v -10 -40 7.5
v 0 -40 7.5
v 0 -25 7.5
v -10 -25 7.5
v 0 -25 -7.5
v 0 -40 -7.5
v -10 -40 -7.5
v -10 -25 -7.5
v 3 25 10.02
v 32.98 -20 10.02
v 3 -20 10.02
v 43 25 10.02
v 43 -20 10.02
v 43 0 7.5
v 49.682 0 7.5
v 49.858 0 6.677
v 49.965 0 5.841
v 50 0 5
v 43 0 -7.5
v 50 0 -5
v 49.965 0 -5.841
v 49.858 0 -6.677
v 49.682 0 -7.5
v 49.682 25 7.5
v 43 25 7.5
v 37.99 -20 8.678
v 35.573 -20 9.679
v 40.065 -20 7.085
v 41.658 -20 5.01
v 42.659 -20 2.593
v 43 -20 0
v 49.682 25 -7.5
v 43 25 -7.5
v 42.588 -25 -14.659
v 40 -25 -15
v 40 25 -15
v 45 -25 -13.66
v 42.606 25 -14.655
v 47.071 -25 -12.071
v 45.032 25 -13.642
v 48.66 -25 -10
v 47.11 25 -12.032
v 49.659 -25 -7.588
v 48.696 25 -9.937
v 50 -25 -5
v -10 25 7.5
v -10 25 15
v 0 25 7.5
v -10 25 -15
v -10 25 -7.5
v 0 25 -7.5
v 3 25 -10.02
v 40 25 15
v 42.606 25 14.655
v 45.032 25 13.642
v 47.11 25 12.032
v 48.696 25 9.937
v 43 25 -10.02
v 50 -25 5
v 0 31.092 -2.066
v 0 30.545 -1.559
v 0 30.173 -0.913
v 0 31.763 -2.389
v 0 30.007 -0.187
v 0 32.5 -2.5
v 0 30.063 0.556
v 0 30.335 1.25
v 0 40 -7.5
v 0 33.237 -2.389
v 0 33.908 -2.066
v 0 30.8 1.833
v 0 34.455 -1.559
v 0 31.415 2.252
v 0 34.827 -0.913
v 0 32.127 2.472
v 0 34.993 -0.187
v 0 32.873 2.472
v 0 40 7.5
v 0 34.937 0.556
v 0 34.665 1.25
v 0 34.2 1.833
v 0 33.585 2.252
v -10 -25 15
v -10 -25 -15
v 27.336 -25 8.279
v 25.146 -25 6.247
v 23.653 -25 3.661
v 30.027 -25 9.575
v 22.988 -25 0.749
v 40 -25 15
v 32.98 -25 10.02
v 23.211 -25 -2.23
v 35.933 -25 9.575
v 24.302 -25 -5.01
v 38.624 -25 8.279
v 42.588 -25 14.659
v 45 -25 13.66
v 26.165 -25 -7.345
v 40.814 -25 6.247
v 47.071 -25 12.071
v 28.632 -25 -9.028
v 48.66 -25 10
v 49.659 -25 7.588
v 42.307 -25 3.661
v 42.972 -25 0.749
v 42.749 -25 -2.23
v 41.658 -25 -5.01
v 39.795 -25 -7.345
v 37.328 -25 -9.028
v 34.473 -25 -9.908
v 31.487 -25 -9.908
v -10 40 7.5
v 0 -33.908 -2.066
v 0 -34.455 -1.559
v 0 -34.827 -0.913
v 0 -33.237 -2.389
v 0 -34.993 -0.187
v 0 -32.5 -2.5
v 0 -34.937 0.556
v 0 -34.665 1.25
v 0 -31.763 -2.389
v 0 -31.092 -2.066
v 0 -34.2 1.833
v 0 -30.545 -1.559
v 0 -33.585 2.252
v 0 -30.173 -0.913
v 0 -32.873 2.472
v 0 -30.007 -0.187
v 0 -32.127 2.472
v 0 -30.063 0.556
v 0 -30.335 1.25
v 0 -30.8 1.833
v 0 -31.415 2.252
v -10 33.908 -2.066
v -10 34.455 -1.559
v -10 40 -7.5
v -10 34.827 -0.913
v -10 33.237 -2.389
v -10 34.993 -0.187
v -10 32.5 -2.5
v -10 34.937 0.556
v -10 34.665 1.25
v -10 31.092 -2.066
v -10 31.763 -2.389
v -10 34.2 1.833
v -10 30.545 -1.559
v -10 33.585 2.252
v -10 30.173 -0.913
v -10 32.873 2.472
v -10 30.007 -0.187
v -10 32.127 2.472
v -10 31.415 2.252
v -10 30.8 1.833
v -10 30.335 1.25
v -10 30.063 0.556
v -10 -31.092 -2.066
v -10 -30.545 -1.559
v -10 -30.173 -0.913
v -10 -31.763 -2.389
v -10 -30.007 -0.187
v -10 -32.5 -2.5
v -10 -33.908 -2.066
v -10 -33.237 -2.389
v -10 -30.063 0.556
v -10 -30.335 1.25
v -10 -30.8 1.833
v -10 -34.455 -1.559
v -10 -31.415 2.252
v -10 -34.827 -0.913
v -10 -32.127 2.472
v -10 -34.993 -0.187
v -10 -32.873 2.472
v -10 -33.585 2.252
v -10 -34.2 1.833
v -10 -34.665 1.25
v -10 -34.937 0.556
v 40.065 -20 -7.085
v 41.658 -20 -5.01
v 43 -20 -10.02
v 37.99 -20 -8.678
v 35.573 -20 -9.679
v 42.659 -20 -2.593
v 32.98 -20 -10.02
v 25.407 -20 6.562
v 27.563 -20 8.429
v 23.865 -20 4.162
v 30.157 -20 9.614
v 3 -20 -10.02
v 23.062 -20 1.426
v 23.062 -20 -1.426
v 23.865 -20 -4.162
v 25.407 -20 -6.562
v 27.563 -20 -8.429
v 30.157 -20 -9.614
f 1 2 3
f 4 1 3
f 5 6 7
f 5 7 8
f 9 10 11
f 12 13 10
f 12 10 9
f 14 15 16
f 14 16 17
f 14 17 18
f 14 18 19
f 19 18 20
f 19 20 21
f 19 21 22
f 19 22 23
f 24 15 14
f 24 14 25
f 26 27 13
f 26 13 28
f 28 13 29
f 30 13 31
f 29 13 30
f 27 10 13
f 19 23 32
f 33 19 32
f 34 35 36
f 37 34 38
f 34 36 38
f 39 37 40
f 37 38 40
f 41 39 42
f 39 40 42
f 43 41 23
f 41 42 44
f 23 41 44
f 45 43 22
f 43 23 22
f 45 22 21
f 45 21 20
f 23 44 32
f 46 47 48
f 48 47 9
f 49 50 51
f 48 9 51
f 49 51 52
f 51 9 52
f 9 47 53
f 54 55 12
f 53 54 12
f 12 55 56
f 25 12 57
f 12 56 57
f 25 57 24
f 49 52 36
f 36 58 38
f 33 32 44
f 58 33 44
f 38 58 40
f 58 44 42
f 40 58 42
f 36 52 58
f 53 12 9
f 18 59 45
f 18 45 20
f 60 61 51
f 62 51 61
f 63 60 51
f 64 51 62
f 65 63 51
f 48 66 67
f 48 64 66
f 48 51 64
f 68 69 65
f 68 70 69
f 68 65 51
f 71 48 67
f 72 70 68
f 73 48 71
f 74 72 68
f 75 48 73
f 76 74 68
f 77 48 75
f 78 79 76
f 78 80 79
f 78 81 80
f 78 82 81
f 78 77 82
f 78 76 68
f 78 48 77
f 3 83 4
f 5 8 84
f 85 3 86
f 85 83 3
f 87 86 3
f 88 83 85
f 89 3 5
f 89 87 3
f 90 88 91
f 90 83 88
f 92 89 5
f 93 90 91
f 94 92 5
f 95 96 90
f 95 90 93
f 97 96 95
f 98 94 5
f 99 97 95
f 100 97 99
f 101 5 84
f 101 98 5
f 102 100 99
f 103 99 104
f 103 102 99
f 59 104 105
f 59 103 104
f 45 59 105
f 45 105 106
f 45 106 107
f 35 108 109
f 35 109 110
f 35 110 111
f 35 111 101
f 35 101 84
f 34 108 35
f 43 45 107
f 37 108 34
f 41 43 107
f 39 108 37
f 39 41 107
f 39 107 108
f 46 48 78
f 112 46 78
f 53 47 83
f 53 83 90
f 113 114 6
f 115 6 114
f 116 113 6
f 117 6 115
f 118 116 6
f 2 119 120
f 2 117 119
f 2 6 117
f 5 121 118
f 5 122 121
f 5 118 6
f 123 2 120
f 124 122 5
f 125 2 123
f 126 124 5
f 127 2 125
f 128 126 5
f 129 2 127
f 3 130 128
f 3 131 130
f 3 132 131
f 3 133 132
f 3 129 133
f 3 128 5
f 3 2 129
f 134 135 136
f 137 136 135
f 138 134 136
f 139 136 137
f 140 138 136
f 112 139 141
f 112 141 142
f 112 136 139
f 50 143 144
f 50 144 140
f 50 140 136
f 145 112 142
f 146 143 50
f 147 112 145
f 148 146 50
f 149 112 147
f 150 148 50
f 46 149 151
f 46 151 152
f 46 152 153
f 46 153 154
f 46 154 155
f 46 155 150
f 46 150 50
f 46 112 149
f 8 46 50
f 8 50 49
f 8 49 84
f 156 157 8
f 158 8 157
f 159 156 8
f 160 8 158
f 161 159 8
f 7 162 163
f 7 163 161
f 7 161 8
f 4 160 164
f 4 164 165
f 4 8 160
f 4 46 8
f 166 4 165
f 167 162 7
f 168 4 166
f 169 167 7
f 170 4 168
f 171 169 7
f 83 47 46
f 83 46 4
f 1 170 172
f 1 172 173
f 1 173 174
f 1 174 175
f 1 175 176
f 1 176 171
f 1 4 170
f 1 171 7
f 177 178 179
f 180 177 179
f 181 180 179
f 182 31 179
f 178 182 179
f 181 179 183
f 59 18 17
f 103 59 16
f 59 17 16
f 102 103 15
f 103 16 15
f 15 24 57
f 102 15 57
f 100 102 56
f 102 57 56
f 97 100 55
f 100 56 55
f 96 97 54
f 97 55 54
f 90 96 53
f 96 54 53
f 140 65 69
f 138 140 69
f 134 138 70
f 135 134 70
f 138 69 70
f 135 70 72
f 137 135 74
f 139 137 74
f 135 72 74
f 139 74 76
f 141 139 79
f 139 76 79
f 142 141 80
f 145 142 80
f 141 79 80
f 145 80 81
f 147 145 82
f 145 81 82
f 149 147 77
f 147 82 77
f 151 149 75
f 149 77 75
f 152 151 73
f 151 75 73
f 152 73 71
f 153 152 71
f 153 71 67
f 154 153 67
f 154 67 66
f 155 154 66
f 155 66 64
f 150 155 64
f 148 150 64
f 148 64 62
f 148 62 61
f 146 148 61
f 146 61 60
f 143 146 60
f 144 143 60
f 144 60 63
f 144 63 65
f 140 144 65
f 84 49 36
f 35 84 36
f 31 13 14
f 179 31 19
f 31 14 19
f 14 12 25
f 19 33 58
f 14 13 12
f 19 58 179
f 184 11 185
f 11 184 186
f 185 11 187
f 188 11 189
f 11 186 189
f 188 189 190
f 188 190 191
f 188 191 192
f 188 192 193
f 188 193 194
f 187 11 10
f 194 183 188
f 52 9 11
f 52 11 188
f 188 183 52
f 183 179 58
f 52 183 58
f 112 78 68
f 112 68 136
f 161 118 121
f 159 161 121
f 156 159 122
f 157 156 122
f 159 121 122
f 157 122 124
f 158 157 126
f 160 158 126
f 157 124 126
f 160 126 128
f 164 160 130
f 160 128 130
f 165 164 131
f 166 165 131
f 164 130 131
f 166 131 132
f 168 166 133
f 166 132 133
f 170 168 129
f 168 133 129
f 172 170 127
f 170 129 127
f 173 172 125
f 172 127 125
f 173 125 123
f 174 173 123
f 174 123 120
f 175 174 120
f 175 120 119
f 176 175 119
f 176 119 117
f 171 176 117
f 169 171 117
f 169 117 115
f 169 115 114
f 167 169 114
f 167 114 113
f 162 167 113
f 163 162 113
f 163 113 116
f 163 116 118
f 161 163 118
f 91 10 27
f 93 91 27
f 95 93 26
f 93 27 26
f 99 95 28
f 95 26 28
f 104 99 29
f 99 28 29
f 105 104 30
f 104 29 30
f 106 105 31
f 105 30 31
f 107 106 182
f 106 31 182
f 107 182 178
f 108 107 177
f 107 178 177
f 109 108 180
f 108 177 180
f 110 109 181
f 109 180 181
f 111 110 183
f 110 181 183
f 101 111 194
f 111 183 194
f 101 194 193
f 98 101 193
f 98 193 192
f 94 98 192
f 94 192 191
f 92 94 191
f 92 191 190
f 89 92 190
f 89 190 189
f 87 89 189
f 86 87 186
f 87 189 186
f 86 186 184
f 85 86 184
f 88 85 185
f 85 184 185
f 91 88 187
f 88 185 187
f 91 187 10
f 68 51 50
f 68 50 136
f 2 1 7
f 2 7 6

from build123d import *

# Parameters (mm, degrees)
BOSS_EXTRUDE1_DEPTH = 15
CUT_EXTRUDE1_START  = -7
SKETCH2_W           = 20.04
SKETCH2_H           = 45
CUT_EXTRUDE1_DEPTH  = 40
SKETCH5_R           = 10.02
CUT_EXTRUDE2_DEPTH  = 40
SKETCH6_W           = 15
SKETCH6_H           = 25
CUT_EXTRUDE3_DEPTH  = 40
SKETCH7_R           = 2.5
SKETCH7_W           = 7.5
SKETCH7_H           = 15
CUT_EXTRUDE4_DEPTH  = 40
FILLET1_R           = 10


with BuildPart() as part:
    # Sketch1 → Boss-Extrude1 (new, symmetric)
    with BuildSketch(Plane.XY):
        Polygon((-10, 40), (-10, -40), (0, -40), (0, -25), (50, -25), (50, 25), (0, 25), (0, 40), align=None)
    extrude(amount=BOSS_EXTRUDE1_DEPTH, both=True)

    # Sketch2 → Cut-Extrude1 (cut)
    with BuildSketch(Plane(origin=(50, 0, 0), x_dir=(0, 0, -1), z_dir=(1, 0, 0)).offset(CUT_EXTRUDE1_START)):
        with Locations((0, 2.5)):
            Rectangle(SKETCH2_W, SKETCH2_H)
    extrude(amount=-CUT_EXTRUDE1_DEPTH, mode=Mode.SUBTRACT)

    # Sketch5 → Cut-Extrude2 (cut)
    with BuildSketch(Plane(origin=(0, -20, 0), x_dir=(1, 0, 0), z_dir=(0, 1, 0))):
        with Locations(Location((32.98, 0, 0), (0, 0, 270))):
            Circle(SKETCH5_R)
    extrude(amount=-CUT_EXTRUDE2_DEPTH, mode=Mode.SUBTRACT)

    # Sketch6 → Cut-Extrude3 (cut)
    with BuildSketch(Plane(origin=(50, 0, 0), x_dir=(0, 0, -1), z_dir=(1, 0, 0))):
        with Locations((0, 12.5)):
            Rectangle(SKETCH6_W, SKETCH6_H)
    extrude(amount=-CUT_EXTRUDE3_DEPTH, mode=Mode.SUBTRACT)

    # Sketch7 → Cut-Extrude4 (cut)
    with BuildSketch(Plane(origin=(0, 0, 0), x_dir=(0, 0, -1), z_dir=(1, 0, 0))):
        with Locations((0, 32.5)):
            Circle(SKETCH7_R)
        with Locations((0, -32.5)):
            Circle(SKETCH7_R)
        with Locations((11.25, 32.5)):
            Rectangle(SKETCH7_W, SKETCH7_H)
        with Locations((-11.25, 32.5)):
            Rectangle(SKETCH7_W, SKETCH7_H)
        with Locations((-11.25, -32.5)):
            Rectangle(SKETCH7_W, SKETCH7_H)
        with Locations((11.25, -32.5)):
            Rectangle(SKETCH7_W, SKETCH7_H)
    extrude(amount=-CUT_EXTRUDE4_DEPTH, mode=Mode.SUBTRACT)

    # Fillet1
    fillet1_edges = [part.edges().sort_by_distance(p)[0] for p in [
        (50, 0, -15),
        (50, 0, 15),
    ]]
    fillet(fillet1_edges, radius=FILLET1_R)


solid = part.part
